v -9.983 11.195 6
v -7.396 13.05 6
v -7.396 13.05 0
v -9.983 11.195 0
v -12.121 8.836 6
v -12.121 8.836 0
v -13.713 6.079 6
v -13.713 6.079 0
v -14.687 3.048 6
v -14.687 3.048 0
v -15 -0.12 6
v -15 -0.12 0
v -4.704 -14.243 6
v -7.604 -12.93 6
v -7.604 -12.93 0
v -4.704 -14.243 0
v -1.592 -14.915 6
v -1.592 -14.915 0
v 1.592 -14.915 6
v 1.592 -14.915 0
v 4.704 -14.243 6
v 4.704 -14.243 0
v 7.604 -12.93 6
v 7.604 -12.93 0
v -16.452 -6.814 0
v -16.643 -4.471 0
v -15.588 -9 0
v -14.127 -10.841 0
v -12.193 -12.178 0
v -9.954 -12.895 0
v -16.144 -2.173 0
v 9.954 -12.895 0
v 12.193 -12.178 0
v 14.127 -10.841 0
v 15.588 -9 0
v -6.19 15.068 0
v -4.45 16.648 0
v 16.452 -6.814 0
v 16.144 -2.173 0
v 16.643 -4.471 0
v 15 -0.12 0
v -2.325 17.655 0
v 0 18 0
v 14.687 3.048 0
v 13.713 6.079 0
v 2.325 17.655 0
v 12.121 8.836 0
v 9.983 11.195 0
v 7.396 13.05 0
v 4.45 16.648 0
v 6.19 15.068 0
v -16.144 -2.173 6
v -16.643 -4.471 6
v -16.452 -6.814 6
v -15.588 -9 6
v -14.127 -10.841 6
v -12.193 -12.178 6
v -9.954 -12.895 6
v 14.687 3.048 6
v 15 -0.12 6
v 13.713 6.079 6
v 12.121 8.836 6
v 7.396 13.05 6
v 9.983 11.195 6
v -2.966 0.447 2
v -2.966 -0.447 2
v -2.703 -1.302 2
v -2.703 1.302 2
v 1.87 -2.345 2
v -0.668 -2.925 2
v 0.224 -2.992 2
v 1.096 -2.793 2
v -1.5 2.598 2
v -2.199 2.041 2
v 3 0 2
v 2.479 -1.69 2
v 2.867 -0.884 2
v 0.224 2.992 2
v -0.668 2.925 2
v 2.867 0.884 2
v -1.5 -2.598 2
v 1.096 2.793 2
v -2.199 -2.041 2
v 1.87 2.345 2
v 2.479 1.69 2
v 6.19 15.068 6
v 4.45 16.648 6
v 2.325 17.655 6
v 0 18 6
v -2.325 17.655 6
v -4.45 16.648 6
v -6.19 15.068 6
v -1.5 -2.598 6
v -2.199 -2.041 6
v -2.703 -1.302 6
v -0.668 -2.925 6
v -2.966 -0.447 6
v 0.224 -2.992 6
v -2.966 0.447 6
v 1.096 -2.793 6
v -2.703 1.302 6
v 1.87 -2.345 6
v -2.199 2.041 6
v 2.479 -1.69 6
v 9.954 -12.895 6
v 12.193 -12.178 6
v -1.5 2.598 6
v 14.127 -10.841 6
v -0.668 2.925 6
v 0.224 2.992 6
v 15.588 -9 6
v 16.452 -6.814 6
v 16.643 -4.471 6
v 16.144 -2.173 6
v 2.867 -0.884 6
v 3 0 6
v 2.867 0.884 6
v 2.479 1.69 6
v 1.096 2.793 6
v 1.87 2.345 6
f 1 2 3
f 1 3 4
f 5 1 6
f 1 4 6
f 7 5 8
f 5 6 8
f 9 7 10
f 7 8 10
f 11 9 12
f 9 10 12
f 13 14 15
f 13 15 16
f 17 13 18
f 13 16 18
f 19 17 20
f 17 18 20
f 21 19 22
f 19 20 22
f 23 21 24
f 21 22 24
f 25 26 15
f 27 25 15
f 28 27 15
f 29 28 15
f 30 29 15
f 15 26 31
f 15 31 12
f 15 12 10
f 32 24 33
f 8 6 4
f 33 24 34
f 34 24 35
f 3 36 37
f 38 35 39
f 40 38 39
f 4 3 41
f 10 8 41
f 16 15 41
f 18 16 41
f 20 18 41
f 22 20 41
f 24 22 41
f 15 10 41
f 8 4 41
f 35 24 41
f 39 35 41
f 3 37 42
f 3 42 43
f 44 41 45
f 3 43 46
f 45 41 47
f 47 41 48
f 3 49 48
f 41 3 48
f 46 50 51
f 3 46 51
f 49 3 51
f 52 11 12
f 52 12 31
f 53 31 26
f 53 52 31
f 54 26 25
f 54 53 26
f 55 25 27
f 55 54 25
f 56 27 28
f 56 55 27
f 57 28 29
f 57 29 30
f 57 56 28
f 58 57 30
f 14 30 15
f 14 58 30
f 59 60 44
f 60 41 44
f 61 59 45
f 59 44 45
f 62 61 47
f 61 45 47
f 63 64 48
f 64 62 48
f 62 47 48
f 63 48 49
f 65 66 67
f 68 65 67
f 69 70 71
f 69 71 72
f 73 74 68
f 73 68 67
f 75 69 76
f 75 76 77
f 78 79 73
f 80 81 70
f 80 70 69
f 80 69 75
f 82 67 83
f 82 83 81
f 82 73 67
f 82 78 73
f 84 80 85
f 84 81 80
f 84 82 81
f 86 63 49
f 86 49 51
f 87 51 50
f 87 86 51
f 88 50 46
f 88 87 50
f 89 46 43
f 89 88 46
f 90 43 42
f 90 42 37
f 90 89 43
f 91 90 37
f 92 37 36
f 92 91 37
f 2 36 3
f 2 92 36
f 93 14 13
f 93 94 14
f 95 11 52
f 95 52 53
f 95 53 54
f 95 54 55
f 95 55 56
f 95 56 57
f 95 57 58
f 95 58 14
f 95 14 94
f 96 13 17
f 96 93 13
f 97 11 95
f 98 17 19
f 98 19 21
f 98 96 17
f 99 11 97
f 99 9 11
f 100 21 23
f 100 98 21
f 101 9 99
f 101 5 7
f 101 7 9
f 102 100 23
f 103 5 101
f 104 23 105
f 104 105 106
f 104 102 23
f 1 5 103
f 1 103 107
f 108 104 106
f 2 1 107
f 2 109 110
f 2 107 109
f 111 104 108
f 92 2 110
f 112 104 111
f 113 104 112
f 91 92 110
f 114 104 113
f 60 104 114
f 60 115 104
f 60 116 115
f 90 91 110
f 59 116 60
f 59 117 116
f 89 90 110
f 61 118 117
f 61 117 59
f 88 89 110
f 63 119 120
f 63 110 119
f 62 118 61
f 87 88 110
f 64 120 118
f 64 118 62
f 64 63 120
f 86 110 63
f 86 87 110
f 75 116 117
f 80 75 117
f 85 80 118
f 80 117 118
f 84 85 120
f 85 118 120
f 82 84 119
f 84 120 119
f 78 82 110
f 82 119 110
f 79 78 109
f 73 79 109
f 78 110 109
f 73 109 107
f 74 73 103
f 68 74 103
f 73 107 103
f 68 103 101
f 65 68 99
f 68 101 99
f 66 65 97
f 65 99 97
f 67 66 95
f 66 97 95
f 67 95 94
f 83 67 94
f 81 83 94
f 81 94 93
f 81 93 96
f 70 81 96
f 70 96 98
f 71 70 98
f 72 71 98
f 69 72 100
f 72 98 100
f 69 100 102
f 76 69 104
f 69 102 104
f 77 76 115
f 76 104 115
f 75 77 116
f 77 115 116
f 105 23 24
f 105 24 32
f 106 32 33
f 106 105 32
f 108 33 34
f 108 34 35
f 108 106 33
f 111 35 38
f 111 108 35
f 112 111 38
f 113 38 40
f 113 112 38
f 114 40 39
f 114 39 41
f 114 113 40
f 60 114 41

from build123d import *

# Parameters (mm, degrees)
ESQUISSE1_R             = 15
EXTRUSION1_DEPTH        = 6
ESQUISSE2_R             = 3
ENL_V_MAT_EXTRU_1_DEPTH = 4
EXTRUSION2_DEPTH        = 6


with BuildPart() as part:
    # Esquisse1 → Extrusion1 (new body)
    with BuildSketch(Plane.XY):
        Circle(ESQUISSE1_R)
    extrude(amount=EXTRUSION1_DEPTH)

    # Esquisse2 → Enlèv. mat.-Extru.1 (cut)
    with BuildSketch(Plane.XY.offset(6)):
        Circle(ESQUISSE2_R)
    extrude(amount=-ENL_V_MAT_EXTRU_1_DEPTH, mode=Mode.SUBTRACT)

    # Esquisse3 → Extrusion2 (add)
    with BuildSketch(Plane.XY.offset(6)):
        with BuildLine():
            Line((-8, 10), (8, 10))
            ThreePointArc((8, 10), (0, 18), (-8, 10))
        make_face()
        with BuildLine():
            Line((12.660254038, 1.92820323), (4.660254038, -11.92820323))
            ThreePointArc((4.660254038, -11.92820323), (15.588457268, -9), (12.660254038, 1.92820323))
        make_face()
        with BuildLine():
            Line((-4.660254038, -11.92820323), (-12.660254038, 1.92820323))
            ThreePointArc((-12.660254038, 1.92820323), (-15.588457268, -9), (-4.660254038, -11.92820323))
        make_face()
    extrude(amount=-EXTRUSION2_DEPTH)


solid = part.part
